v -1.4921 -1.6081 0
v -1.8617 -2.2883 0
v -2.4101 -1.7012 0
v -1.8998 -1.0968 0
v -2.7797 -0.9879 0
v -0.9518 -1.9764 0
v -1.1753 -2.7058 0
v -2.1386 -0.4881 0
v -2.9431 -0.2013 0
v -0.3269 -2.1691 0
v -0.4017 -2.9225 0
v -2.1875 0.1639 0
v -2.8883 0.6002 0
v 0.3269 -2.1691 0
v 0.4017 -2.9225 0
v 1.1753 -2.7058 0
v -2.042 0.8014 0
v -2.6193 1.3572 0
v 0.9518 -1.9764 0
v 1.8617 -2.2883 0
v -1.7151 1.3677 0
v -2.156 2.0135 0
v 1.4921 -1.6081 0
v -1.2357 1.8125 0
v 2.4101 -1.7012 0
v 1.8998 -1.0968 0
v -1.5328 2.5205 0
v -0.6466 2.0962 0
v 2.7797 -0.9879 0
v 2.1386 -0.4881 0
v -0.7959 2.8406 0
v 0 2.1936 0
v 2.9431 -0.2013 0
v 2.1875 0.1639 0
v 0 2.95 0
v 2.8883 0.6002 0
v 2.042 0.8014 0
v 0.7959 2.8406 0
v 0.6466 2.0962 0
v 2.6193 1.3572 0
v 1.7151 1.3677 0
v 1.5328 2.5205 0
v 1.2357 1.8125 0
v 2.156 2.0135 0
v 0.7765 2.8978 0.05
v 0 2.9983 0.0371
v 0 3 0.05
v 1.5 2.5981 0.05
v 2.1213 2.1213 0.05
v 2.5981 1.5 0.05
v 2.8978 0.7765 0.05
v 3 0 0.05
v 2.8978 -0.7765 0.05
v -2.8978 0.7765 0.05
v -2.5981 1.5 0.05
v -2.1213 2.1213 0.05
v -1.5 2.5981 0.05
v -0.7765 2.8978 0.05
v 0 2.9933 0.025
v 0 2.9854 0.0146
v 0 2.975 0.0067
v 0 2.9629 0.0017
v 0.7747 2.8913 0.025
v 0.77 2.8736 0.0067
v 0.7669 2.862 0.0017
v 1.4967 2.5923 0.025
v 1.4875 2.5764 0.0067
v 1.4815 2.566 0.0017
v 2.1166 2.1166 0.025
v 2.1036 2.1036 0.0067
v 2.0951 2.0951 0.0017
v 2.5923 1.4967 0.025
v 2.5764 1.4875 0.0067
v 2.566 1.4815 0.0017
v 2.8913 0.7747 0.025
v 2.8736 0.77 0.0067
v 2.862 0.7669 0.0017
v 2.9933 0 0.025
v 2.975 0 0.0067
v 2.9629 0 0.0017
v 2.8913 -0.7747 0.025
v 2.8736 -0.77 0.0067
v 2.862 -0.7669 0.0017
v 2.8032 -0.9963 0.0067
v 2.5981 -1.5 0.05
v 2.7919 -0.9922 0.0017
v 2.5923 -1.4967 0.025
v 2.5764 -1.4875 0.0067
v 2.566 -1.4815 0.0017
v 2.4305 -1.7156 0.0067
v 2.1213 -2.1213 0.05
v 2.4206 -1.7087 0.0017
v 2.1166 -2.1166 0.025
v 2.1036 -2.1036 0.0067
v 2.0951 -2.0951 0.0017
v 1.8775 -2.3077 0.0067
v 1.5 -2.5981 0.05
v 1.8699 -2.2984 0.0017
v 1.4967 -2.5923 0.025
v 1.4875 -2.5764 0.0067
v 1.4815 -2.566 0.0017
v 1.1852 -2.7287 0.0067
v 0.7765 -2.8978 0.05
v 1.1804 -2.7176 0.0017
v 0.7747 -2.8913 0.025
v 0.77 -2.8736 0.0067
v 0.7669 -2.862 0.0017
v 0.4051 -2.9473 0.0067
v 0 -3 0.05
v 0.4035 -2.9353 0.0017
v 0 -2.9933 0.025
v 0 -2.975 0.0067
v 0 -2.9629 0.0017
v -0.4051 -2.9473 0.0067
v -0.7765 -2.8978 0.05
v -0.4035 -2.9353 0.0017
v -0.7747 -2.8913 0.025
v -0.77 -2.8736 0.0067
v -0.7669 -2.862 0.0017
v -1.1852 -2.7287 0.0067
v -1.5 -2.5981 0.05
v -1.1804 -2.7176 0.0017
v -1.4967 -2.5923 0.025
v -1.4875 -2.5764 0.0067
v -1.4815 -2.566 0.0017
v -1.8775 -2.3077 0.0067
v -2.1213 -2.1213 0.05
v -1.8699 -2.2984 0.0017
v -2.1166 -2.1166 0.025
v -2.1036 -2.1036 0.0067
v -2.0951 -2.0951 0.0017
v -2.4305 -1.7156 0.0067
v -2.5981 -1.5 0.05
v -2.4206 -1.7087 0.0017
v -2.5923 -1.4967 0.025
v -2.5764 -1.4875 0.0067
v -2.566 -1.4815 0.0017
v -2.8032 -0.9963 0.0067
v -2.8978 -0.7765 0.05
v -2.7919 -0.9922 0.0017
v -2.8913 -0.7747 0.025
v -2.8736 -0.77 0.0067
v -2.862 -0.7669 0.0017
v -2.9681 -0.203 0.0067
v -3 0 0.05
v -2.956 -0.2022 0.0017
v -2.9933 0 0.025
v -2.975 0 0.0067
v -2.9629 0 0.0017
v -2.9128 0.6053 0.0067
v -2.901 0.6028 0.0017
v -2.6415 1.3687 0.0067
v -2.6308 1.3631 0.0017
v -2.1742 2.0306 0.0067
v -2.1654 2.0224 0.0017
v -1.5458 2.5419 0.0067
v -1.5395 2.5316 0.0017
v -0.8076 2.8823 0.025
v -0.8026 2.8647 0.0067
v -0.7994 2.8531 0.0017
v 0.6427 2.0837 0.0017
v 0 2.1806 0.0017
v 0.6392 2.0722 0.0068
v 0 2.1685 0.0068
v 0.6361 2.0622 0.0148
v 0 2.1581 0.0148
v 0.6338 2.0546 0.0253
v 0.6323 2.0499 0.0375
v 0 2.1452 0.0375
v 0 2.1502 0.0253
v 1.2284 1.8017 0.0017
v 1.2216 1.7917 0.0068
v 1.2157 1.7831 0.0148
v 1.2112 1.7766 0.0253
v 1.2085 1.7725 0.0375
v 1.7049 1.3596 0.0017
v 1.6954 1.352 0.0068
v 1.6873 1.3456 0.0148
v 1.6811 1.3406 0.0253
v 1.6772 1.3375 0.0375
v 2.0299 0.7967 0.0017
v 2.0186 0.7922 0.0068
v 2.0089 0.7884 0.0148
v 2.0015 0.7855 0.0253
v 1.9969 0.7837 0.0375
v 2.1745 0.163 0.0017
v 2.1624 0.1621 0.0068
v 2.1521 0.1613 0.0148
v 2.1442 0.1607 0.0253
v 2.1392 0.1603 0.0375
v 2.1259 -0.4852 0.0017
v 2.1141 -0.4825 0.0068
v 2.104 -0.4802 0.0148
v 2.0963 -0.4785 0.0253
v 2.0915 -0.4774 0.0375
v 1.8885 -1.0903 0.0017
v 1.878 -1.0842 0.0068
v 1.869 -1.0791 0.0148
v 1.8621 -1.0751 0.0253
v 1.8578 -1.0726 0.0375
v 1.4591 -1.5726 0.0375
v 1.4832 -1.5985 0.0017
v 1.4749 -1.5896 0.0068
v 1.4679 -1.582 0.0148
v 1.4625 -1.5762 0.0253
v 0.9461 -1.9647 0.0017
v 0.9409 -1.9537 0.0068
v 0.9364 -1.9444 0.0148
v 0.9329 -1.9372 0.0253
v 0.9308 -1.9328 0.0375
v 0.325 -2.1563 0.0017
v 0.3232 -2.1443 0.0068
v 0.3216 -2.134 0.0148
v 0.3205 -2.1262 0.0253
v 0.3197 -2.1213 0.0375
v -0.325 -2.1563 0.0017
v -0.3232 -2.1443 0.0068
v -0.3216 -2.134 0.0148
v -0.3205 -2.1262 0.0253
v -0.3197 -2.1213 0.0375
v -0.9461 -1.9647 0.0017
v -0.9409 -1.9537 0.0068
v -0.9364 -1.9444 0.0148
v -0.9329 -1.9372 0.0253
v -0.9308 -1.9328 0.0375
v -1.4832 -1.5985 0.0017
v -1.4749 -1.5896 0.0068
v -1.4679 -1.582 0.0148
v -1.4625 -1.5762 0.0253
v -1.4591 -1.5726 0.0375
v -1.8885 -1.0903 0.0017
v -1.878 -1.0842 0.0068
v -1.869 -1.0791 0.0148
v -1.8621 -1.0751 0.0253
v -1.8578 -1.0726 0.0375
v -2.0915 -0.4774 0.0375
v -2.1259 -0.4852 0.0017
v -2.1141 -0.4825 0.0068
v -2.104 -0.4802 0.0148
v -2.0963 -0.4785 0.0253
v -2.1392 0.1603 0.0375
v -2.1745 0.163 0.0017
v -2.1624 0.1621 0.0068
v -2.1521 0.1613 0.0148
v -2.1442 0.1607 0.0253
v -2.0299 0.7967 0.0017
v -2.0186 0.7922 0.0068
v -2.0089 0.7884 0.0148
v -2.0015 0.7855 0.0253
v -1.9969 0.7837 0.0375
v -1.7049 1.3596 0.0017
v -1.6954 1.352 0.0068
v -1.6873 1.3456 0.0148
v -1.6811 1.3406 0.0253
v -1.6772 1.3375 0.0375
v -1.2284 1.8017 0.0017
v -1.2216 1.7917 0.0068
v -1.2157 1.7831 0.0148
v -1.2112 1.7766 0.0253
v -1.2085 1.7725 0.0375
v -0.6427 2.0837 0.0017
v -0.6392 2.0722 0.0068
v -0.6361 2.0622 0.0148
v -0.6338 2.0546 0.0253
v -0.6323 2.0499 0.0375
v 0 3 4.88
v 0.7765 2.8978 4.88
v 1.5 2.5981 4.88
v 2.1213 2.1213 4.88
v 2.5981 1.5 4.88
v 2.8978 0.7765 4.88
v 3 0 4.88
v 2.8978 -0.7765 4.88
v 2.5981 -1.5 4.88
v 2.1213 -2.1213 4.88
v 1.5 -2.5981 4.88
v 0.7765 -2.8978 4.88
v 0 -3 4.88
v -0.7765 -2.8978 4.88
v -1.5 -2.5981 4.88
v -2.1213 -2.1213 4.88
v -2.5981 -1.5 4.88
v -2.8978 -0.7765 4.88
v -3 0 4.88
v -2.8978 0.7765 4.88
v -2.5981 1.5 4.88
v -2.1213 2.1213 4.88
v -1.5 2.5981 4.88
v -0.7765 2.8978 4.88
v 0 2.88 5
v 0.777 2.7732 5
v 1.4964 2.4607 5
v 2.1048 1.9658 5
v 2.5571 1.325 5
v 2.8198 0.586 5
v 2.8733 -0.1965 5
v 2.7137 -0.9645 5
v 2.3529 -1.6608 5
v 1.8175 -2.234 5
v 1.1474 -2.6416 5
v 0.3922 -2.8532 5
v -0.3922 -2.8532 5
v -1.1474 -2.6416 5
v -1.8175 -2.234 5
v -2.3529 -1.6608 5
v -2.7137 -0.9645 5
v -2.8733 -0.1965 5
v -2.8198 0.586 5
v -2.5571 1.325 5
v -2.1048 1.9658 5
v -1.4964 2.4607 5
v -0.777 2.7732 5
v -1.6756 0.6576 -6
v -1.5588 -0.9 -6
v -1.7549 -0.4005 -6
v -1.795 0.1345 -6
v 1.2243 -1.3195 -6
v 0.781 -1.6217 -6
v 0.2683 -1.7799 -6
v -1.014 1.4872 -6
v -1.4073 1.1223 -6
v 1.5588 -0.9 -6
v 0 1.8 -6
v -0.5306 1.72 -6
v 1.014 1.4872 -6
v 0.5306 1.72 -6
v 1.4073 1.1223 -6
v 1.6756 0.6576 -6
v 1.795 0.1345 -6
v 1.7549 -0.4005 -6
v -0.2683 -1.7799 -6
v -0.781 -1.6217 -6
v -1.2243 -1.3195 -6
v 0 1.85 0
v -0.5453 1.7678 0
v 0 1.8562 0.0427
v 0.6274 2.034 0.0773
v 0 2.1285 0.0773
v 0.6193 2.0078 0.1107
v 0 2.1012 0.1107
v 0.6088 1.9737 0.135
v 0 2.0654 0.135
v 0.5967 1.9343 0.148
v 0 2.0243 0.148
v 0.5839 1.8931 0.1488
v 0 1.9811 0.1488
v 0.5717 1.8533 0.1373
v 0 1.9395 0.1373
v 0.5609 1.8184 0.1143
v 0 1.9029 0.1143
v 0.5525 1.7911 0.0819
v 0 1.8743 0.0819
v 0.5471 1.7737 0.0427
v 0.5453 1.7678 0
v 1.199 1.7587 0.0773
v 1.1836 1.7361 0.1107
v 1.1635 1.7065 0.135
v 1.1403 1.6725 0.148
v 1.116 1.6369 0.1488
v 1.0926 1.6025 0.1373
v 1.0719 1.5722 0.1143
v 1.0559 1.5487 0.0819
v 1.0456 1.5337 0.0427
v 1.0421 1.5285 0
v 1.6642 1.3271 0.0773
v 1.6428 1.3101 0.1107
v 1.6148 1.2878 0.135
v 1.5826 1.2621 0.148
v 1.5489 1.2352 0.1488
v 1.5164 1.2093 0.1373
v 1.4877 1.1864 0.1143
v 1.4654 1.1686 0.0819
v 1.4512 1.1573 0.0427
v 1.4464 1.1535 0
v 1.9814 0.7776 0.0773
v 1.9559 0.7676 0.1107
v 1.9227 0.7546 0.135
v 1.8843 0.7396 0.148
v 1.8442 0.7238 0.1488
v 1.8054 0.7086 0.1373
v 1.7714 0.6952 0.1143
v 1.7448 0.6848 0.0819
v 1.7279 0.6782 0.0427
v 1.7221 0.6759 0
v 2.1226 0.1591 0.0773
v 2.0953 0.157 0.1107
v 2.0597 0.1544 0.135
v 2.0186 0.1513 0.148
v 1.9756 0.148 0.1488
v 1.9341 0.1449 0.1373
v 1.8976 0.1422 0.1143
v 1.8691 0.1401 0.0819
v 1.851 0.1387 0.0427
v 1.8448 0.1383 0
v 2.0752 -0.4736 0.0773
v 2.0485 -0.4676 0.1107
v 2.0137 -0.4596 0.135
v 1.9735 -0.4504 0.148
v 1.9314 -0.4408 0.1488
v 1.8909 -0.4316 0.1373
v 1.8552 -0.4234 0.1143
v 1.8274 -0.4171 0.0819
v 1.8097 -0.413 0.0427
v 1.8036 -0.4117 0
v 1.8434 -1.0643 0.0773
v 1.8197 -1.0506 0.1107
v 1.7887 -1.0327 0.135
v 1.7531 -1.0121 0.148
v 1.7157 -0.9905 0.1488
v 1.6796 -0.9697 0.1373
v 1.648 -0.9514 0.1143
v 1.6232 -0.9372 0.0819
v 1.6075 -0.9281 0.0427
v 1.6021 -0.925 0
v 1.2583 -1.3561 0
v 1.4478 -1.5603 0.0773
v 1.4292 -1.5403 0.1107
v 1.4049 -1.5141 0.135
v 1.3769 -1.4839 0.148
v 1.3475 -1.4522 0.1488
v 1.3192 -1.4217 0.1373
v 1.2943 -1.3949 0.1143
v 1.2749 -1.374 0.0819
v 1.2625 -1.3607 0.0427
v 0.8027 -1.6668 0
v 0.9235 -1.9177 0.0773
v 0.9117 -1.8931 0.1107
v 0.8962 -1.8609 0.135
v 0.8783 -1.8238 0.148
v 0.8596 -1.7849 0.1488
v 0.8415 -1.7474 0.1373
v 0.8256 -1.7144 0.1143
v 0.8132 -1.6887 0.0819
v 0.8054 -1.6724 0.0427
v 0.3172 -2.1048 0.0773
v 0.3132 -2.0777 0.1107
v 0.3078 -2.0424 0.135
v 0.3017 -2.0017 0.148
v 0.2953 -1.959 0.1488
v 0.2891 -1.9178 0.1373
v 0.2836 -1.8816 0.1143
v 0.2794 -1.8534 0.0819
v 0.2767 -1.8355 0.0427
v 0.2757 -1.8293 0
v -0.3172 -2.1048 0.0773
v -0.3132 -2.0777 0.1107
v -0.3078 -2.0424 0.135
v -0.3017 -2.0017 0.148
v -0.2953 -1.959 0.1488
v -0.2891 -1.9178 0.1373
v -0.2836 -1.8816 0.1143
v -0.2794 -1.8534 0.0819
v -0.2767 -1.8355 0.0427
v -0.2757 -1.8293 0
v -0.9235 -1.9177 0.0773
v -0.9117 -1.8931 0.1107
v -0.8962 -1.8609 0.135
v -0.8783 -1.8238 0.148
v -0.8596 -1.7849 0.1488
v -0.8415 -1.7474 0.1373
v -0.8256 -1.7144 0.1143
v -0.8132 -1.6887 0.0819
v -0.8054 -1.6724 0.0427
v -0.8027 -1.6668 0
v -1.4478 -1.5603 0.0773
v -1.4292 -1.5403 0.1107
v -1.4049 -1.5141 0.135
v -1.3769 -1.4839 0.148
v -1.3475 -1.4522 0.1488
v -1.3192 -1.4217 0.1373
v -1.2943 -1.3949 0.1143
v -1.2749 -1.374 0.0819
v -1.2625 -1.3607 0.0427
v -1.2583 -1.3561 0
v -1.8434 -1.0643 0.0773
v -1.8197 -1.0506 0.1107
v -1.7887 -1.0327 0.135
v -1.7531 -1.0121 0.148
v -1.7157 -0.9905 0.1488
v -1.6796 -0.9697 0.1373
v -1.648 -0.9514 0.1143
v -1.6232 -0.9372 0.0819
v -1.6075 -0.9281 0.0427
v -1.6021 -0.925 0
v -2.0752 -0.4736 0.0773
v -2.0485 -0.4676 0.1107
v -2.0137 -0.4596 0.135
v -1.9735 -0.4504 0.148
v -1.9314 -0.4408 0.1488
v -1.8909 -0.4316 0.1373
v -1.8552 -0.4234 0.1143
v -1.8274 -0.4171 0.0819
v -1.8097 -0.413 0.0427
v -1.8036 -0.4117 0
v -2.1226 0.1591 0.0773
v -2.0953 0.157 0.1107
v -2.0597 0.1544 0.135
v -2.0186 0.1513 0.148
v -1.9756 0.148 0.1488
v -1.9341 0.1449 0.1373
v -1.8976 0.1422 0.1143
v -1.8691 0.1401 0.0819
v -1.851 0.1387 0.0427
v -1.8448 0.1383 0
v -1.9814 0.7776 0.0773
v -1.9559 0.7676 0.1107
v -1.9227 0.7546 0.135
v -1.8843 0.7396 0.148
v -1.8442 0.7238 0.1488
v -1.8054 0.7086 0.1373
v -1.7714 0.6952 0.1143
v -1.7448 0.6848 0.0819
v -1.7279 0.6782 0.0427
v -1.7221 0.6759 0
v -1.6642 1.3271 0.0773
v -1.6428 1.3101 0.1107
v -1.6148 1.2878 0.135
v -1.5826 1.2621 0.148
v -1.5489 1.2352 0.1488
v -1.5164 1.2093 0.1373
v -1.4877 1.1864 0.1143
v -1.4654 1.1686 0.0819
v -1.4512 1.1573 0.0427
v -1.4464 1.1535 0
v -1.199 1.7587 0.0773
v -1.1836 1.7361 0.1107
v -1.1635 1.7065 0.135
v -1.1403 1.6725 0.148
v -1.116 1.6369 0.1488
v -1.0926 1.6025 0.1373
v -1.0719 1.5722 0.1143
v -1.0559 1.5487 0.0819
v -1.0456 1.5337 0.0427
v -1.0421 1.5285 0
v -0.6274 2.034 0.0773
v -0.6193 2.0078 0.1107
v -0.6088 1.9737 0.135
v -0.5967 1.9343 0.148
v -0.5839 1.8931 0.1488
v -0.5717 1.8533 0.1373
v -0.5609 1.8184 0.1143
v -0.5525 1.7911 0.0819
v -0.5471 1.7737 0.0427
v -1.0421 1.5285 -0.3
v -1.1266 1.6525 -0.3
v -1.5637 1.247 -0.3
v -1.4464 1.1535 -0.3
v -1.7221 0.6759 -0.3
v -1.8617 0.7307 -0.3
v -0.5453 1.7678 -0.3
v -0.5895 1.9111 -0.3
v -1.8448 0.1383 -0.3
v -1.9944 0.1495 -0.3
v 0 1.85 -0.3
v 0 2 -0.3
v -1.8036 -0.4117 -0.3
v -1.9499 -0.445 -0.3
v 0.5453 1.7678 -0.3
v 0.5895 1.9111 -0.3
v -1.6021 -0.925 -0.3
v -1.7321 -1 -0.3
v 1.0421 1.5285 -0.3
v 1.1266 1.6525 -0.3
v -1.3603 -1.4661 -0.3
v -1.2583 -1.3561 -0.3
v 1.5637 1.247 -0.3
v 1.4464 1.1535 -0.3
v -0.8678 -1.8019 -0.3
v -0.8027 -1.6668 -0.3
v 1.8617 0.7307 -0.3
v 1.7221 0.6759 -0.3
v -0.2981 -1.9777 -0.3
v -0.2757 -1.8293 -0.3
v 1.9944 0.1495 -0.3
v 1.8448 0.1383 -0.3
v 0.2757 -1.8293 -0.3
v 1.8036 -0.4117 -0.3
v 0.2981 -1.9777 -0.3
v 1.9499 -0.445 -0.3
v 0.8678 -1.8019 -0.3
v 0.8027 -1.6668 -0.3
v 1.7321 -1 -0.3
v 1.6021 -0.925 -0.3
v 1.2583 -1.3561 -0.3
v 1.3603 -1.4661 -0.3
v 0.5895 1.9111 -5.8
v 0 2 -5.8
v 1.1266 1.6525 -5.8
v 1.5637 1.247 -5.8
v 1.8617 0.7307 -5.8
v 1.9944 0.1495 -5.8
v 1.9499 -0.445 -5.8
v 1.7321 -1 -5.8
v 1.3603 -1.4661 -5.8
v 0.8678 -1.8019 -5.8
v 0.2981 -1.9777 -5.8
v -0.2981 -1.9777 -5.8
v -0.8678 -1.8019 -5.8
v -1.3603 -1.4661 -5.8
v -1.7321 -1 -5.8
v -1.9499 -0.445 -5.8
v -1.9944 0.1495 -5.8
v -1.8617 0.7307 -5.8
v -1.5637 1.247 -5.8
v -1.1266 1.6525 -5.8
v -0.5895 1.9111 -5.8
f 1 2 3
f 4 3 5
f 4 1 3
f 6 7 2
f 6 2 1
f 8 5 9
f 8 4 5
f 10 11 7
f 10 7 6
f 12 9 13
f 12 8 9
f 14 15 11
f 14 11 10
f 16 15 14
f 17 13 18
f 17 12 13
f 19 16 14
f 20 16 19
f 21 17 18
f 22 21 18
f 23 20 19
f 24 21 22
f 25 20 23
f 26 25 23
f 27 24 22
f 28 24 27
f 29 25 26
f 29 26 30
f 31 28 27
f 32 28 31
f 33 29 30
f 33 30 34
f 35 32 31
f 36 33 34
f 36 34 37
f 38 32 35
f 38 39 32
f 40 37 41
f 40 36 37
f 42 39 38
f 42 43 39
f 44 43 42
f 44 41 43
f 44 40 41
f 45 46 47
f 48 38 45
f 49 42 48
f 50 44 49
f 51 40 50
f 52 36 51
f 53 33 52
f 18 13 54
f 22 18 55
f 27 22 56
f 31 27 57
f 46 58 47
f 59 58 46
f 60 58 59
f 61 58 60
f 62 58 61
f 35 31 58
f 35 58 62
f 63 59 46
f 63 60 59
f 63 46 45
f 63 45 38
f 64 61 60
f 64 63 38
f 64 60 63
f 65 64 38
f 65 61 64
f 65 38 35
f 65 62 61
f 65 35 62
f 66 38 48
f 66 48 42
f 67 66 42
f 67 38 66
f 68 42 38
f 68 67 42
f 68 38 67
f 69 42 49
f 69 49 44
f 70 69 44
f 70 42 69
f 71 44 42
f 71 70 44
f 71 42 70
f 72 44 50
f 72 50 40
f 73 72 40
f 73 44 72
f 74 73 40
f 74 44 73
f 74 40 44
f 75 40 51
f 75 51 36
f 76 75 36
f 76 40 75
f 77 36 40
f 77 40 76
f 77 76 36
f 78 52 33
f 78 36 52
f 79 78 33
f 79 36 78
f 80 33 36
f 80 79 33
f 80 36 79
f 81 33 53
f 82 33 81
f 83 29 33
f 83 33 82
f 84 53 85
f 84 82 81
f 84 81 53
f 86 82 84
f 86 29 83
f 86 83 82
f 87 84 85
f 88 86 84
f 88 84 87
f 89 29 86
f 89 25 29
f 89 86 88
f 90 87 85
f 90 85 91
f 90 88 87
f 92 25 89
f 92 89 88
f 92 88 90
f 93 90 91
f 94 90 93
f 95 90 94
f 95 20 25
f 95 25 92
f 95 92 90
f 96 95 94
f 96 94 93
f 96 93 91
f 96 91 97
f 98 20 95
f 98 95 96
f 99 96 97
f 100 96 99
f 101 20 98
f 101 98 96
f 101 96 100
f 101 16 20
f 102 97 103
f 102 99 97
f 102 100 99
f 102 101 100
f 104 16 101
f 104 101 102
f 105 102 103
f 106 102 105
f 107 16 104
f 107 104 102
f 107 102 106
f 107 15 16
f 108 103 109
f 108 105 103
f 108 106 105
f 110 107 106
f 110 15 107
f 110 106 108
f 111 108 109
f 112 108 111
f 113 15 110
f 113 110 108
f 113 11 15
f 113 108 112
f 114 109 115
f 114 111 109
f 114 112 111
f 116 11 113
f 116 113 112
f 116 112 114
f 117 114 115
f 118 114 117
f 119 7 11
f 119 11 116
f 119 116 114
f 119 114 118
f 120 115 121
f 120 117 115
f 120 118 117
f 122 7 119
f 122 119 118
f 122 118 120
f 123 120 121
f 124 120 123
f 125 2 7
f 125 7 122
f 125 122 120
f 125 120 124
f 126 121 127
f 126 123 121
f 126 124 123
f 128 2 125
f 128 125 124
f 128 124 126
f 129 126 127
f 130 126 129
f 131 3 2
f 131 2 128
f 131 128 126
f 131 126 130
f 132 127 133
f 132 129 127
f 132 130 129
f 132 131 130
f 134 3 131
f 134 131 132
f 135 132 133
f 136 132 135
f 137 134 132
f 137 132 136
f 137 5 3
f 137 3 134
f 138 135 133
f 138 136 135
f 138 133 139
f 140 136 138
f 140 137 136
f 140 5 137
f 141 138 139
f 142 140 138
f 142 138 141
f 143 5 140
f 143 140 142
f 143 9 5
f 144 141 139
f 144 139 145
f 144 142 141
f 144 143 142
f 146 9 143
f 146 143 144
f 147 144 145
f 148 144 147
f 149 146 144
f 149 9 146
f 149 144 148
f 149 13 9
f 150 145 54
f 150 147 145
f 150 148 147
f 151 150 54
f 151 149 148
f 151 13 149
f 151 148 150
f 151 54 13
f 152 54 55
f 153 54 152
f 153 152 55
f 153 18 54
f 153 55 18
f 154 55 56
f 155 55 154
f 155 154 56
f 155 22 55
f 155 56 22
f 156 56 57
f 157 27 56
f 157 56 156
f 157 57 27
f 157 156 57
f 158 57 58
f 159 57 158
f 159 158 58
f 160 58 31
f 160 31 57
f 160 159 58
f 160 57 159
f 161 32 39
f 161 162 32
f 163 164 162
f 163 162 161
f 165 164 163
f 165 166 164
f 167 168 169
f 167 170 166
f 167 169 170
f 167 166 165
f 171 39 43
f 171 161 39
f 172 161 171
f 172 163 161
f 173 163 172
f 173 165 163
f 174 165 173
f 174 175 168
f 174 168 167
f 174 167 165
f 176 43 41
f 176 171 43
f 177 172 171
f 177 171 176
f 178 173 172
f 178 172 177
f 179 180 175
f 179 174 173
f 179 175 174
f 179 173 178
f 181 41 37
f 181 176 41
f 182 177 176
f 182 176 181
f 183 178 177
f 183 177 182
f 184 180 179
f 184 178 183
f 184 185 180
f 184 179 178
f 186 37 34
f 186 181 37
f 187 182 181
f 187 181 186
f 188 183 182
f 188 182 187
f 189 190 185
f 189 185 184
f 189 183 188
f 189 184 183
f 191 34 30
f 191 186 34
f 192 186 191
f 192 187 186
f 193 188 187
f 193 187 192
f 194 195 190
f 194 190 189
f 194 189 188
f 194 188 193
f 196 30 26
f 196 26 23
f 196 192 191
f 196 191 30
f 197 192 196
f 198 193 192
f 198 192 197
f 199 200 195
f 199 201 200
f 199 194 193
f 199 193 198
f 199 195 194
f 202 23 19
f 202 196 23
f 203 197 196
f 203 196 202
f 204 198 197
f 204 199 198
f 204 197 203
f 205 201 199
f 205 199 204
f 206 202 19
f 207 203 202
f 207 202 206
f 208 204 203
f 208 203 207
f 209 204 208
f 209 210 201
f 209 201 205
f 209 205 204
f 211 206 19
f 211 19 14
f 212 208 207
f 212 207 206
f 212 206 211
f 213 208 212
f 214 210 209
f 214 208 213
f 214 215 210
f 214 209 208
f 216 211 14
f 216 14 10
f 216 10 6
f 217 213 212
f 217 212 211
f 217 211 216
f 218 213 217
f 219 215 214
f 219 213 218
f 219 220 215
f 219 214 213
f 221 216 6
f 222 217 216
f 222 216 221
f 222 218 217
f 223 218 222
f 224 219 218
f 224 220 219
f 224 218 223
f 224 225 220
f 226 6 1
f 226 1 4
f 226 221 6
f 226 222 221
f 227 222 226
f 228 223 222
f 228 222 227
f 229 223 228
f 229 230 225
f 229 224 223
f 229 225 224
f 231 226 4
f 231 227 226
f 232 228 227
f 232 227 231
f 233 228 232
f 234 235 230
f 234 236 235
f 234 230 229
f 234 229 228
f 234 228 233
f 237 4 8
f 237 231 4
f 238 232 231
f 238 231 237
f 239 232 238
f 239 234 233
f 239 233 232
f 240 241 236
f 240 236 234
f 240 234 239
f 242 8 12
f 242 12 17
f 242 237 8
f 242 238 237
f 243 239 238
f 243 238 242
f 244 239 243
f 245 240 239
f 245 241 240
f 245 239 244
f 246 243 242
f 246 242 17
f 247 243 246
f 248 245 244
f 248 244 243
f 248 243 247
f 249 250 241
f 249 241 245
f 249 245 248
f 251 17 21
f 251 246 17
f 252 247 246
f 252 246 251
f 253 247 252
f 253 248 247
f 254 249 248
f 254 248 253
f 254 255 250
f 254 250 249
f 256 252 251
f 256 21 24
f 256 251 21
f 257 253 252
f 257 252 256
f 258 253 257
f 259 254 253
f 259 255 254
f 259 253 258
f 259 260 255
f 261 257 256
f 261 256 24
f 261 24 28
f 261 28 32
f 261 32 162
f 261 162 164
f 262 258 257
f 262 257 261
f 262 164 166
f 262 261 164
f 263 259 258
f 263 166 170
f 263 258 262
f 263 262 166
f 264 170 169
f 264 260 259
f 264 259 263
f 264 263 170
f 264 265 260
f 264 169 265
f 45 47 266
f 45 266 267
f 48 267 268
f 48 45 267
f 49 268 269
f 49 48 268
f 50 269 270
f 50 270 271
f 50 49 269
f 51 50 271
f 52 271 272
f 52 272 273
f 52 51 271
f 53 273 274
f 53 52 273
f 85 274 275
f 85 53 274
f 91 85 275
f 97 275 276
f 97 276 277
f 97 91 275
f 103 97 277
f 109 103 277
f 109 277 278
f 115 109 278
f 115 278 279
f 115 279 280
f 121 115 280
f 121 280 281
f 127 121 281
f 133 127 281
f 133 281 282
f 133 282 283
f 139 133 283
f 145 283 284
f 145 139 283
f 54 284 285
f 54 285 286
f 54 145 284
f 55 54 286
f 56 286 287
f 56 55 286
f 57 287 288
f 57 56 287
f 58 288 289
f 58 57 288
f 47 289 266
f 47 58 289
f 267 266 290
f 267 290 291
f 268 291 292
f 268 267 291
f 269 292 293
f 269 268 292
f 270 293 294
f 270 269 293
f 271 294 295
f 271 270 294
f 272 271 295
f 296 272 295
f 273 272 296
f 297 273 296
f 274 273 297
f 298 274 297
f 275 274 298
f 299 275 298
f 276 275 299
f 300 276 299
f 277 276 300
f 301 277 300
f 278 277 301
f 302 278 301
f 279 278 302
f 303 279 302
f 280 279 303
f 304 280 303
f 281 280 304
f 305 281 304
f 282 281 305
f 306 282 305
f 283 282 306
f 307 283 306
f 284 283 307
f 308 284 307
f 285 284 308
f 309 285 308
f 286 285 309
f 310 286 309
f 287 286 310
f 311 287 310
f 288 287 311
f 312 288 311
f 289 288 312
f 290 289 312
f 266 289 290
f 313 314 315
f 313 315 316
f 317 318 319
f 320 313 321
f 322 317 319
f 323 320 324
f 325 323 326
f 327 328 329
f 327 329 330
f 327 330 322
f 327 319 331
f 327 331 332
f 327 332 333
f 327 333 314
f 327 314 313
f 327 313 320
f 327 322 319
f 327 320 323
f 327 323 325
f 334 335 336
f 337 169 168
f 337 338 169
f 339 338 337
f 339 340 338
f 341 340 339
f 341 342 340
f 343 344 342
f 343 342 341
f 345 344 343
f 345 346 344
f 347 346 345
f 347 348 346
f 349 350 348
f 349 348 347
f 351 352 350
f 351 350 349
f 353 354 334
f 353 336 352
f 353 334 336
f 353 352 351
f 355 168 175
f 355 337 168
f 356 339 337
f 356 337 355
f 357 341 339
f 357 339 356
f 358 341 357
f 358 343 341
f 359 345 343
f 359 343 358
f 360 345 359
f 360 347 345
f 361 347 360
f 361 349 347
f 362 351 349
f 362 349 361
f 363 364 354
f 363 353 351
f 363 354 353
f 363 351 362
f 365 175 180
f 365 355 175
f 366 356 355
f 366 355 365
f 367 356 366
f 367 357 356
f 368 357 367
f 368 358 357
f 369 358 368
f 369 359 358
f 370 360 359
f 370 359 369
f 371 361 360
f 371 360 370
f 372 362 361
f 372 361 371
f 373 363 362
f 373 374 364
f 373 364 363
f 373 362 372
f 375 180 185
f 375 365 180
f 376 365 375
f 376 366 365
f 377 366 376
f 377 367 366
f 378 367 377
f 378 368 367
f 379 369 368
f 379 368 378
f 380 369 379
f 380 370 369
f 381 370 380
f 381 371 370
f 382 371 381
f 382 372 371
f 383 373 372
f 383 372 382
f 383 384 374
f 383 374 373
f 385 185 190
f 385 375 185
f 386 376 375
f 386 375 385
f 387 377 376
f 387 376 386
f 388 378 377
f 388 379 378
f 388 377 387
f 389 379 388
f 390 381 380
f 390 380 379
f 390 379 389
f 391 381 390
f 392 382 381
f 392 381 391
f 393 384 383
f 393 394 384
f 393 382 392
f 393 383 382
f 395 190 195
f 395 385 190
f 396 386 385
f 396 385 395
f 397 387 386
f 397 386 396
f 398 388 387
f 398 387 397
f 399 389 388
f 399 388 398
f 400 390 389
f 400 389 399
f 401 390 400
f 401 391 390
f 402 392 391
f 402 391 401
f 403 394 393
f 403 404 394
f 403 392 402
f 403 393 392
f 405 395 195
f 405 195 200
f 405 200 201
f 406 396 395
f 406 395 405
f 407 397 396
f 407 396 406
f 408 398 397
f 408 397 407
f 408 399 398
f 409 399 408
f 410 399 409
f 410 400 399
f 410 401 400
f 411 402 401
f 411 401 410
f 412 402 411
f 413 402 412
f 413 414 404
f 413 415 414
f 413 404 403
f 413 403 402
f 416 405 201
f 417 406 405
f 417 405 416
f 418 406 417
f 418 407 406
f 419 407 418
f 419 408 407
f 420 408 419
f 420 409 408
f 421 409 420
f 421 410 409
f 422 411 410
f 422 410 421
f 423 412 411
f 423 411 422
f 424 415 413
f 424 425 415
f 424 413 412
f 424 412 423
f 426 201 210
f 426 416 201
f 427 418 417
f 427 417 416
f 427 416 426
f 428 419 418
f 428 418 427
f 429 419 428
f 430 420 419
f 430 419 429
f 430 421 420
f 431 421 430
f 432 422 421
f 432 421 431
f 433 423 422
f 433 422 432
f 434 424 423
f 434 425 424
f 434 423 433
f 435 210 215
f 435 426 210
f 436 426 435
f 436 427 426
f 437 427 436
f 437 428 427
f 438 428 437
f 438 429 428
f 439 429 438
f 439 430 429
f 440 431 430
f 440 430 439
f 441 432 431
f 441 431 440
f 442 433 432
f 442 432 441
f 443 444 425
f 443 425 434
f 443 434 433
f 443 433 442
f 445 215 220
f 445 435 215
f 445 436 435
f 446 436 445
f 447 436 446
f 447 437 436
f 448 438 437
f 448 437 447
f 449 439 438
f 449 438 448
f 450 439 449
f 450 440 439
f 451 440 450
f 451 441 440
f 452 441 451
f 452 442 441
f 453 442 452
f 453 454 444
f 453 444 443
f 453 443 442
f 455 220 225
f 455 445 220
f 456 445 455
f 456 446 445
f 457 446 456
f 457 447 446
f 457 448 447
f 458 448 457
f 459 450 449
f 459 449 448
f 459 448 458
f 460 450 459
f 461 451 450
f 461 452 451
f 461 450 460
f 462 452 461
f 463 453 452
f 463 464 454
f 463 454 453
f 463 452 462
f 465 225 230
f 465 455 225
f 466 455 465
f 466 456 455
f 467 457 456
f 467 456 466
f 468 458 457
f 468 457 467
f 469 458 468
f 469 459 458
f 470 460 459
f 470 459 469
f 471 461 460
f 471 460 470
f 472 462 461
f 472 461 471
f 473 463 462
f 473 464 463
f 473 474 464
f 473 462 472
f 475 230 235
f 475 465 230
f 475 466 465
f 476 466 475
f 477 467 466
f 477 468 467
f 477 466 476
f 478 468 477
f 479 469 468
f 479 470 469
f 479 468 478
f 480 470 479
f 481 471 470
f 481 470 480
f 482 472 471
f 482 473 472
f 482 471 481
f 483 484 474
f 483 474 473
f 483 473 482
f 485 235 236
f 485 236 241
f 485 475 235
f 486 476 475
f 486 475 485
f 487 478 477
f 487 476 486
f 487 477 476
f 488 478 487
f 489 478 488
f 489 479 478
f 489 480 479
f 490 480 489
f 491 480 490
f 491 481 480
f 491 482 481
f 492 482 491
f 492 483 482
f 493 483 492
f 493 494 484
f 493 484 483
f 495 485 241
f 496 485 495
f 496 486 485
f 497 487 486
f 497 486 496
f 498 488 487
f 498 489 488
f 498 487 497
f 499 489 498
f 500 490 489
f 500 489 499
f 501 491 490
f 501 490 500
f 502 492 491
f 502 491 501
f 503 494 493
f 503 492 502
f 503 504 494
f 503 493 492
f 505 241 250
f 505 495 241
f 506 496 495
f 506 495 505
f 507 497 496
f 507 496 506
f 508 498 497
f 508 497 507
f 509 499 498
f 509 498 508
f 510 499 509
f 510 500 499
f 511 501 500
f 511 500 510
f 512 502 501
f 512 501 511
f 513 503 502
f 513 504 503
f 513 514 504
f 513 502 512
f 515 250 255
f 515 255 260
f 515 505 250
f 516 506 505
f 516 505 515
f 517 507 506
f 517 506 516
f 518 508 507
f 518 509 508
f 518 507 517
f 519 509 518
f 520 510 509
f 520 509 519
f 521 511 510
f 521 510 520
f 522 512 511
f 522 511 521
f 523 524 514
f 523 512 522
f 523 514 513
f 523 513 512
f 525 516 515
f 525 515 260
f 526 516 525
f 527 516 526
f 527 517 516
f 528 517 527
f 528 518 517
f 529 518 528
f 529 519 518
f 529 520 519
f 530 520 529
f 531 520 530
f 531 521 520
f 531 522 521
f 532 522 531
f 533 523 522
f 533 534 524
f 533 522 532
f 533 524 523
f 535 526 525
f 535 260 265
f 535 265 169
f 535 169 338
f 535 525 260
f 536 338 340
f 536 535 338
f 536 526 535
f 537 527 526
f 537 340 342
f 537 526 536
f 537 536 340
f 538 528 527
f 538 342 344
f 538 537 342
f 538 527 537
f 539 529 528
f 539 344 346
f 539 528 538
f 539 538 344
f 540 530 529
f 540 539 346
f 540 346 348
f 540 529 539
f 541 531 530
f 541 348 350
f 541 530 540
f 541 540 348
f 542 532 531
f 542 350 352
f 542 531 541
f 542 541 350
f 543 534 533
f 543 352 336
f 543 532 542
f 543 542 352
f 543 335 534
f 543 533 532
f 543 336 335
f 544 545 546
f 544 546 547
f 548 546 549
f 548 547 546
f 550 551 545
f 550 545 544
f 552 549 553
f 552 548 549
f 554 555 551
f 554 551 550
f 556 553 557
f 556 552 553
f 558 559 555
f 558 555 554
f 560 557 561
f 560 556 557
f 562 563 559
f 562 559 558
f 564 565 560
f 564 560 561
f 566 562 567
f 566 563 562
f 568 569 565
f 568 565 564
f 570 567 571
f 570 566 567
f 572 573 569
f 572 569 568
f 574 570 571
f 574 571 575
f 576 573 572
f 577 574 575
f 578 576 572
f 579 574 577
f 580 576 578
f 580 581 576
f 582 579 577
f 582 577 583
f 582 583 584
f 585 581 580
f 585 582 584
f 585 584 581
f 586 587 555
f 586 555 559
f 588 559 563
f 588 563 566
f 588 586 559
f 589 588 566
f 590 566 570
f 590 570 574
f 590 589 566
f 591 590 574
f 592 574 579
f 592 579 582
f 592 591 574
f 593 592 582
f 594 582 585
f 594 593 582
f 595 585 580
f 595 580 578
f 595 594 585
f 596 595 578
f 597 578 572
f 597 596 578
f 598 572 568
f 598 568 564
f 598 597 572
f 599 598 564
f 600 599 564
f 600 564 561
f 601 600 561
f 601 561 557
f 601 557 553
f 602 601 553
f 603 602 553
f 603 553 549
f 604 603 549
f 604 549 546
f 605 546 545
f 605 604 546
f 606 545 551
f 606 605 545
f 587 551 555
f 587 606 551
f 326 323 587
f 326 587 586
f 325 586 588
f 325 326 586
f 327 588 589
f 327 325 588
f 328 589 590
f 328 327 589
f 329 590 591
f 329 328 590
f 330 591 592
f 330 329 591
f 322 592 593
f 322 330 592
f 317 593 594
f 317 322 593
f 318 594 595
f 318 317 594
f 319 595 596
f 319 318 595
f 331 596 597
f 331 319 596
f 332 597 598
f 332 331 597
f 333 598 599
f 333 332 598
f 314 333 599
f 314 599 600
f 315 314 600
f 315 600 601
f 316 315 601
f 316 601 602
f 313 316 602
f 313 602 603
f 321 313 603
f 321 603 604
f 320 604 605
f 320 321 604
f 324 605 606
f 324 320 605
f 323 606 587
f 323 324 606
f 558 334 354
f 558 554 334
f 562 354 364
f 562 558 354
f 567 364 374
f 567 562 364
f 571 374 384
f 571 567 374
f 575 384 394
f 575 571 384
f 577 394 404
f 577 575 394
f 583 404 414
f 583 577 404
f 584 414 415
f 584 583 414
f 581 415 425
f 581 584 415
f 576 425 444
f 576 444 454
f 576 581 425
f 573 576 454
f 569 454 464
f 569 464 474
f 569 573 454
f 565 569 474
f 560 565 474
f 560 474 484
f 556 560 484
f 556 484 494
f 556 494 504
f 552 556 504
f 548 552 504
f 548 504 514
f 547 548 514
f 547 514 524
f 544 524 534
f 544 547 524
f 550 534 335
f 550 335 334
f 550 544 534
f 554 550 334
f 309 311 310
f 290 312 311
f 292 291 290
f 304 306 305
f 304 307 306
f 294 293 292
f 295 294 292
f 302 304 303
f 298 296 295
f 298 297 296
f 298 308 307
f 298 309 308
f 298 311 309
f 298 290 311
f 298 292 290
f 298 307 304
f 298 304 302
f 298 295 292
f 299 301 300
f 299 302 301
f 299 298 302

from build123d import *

# Parameters (mm, degrees)
CHAMFER1_SIZE = 0.12
CHAMFER2_SIZE = 0.2


with BuildPart() as part:
    # Sketch1 → Revolve1 (revolve)
    with BuildSketch(Plane(origin=(0, 0, 0), x_dir=(0, 0, -1), z_dir=(1, 0, 0))):
        with BuildLine():
            Line((-5, 0), (-5, 3))
            Line((-5, 3), (-0.05, 3))
            ThreePointArc((-0.05, 3), (-0.014644661, 2.985355339), (0, 2.95))
            Line((0, 2.95), (0, 2.193649167))
            ThreePointArc((0, 2.193649167), (-0.010471529, 2.163030546), (-0.0375, 2.145236875))
            ThreePointArc((-0.0375, 2.145236875), (-0.148804454, 1.981099356), (0, 1.85))
            Line((0, 1.85), (0.3, 1.85))
            Line((0.3, 1.85), (0.3, 2))
            Line((0.3, 2), (6, 2))
            Line((6, 2), (6, 0))
            Line((6, 0), (-5, 0))
        make_face()
    revolve(axis=Axis((0, 0, 12.7), (0, 0, -1)))

    # Chamfer1
    chamfer1_edges = [part.edges().sort_by_distance(p)[0] for p in [
        (0, -3, 5),
    ]]
    chamfer(chamfer1_edges, length=CHAMFER1_SIZE)

    # Chamfer2
    chamfer2_edges = [part.edges().sort_by_distance(p)[0] for p in [
        (0, -2, -6),
    ]]
    chamfer(chamfer2_edges, length=CHAMFER2_SIZE)


solid = part.part
